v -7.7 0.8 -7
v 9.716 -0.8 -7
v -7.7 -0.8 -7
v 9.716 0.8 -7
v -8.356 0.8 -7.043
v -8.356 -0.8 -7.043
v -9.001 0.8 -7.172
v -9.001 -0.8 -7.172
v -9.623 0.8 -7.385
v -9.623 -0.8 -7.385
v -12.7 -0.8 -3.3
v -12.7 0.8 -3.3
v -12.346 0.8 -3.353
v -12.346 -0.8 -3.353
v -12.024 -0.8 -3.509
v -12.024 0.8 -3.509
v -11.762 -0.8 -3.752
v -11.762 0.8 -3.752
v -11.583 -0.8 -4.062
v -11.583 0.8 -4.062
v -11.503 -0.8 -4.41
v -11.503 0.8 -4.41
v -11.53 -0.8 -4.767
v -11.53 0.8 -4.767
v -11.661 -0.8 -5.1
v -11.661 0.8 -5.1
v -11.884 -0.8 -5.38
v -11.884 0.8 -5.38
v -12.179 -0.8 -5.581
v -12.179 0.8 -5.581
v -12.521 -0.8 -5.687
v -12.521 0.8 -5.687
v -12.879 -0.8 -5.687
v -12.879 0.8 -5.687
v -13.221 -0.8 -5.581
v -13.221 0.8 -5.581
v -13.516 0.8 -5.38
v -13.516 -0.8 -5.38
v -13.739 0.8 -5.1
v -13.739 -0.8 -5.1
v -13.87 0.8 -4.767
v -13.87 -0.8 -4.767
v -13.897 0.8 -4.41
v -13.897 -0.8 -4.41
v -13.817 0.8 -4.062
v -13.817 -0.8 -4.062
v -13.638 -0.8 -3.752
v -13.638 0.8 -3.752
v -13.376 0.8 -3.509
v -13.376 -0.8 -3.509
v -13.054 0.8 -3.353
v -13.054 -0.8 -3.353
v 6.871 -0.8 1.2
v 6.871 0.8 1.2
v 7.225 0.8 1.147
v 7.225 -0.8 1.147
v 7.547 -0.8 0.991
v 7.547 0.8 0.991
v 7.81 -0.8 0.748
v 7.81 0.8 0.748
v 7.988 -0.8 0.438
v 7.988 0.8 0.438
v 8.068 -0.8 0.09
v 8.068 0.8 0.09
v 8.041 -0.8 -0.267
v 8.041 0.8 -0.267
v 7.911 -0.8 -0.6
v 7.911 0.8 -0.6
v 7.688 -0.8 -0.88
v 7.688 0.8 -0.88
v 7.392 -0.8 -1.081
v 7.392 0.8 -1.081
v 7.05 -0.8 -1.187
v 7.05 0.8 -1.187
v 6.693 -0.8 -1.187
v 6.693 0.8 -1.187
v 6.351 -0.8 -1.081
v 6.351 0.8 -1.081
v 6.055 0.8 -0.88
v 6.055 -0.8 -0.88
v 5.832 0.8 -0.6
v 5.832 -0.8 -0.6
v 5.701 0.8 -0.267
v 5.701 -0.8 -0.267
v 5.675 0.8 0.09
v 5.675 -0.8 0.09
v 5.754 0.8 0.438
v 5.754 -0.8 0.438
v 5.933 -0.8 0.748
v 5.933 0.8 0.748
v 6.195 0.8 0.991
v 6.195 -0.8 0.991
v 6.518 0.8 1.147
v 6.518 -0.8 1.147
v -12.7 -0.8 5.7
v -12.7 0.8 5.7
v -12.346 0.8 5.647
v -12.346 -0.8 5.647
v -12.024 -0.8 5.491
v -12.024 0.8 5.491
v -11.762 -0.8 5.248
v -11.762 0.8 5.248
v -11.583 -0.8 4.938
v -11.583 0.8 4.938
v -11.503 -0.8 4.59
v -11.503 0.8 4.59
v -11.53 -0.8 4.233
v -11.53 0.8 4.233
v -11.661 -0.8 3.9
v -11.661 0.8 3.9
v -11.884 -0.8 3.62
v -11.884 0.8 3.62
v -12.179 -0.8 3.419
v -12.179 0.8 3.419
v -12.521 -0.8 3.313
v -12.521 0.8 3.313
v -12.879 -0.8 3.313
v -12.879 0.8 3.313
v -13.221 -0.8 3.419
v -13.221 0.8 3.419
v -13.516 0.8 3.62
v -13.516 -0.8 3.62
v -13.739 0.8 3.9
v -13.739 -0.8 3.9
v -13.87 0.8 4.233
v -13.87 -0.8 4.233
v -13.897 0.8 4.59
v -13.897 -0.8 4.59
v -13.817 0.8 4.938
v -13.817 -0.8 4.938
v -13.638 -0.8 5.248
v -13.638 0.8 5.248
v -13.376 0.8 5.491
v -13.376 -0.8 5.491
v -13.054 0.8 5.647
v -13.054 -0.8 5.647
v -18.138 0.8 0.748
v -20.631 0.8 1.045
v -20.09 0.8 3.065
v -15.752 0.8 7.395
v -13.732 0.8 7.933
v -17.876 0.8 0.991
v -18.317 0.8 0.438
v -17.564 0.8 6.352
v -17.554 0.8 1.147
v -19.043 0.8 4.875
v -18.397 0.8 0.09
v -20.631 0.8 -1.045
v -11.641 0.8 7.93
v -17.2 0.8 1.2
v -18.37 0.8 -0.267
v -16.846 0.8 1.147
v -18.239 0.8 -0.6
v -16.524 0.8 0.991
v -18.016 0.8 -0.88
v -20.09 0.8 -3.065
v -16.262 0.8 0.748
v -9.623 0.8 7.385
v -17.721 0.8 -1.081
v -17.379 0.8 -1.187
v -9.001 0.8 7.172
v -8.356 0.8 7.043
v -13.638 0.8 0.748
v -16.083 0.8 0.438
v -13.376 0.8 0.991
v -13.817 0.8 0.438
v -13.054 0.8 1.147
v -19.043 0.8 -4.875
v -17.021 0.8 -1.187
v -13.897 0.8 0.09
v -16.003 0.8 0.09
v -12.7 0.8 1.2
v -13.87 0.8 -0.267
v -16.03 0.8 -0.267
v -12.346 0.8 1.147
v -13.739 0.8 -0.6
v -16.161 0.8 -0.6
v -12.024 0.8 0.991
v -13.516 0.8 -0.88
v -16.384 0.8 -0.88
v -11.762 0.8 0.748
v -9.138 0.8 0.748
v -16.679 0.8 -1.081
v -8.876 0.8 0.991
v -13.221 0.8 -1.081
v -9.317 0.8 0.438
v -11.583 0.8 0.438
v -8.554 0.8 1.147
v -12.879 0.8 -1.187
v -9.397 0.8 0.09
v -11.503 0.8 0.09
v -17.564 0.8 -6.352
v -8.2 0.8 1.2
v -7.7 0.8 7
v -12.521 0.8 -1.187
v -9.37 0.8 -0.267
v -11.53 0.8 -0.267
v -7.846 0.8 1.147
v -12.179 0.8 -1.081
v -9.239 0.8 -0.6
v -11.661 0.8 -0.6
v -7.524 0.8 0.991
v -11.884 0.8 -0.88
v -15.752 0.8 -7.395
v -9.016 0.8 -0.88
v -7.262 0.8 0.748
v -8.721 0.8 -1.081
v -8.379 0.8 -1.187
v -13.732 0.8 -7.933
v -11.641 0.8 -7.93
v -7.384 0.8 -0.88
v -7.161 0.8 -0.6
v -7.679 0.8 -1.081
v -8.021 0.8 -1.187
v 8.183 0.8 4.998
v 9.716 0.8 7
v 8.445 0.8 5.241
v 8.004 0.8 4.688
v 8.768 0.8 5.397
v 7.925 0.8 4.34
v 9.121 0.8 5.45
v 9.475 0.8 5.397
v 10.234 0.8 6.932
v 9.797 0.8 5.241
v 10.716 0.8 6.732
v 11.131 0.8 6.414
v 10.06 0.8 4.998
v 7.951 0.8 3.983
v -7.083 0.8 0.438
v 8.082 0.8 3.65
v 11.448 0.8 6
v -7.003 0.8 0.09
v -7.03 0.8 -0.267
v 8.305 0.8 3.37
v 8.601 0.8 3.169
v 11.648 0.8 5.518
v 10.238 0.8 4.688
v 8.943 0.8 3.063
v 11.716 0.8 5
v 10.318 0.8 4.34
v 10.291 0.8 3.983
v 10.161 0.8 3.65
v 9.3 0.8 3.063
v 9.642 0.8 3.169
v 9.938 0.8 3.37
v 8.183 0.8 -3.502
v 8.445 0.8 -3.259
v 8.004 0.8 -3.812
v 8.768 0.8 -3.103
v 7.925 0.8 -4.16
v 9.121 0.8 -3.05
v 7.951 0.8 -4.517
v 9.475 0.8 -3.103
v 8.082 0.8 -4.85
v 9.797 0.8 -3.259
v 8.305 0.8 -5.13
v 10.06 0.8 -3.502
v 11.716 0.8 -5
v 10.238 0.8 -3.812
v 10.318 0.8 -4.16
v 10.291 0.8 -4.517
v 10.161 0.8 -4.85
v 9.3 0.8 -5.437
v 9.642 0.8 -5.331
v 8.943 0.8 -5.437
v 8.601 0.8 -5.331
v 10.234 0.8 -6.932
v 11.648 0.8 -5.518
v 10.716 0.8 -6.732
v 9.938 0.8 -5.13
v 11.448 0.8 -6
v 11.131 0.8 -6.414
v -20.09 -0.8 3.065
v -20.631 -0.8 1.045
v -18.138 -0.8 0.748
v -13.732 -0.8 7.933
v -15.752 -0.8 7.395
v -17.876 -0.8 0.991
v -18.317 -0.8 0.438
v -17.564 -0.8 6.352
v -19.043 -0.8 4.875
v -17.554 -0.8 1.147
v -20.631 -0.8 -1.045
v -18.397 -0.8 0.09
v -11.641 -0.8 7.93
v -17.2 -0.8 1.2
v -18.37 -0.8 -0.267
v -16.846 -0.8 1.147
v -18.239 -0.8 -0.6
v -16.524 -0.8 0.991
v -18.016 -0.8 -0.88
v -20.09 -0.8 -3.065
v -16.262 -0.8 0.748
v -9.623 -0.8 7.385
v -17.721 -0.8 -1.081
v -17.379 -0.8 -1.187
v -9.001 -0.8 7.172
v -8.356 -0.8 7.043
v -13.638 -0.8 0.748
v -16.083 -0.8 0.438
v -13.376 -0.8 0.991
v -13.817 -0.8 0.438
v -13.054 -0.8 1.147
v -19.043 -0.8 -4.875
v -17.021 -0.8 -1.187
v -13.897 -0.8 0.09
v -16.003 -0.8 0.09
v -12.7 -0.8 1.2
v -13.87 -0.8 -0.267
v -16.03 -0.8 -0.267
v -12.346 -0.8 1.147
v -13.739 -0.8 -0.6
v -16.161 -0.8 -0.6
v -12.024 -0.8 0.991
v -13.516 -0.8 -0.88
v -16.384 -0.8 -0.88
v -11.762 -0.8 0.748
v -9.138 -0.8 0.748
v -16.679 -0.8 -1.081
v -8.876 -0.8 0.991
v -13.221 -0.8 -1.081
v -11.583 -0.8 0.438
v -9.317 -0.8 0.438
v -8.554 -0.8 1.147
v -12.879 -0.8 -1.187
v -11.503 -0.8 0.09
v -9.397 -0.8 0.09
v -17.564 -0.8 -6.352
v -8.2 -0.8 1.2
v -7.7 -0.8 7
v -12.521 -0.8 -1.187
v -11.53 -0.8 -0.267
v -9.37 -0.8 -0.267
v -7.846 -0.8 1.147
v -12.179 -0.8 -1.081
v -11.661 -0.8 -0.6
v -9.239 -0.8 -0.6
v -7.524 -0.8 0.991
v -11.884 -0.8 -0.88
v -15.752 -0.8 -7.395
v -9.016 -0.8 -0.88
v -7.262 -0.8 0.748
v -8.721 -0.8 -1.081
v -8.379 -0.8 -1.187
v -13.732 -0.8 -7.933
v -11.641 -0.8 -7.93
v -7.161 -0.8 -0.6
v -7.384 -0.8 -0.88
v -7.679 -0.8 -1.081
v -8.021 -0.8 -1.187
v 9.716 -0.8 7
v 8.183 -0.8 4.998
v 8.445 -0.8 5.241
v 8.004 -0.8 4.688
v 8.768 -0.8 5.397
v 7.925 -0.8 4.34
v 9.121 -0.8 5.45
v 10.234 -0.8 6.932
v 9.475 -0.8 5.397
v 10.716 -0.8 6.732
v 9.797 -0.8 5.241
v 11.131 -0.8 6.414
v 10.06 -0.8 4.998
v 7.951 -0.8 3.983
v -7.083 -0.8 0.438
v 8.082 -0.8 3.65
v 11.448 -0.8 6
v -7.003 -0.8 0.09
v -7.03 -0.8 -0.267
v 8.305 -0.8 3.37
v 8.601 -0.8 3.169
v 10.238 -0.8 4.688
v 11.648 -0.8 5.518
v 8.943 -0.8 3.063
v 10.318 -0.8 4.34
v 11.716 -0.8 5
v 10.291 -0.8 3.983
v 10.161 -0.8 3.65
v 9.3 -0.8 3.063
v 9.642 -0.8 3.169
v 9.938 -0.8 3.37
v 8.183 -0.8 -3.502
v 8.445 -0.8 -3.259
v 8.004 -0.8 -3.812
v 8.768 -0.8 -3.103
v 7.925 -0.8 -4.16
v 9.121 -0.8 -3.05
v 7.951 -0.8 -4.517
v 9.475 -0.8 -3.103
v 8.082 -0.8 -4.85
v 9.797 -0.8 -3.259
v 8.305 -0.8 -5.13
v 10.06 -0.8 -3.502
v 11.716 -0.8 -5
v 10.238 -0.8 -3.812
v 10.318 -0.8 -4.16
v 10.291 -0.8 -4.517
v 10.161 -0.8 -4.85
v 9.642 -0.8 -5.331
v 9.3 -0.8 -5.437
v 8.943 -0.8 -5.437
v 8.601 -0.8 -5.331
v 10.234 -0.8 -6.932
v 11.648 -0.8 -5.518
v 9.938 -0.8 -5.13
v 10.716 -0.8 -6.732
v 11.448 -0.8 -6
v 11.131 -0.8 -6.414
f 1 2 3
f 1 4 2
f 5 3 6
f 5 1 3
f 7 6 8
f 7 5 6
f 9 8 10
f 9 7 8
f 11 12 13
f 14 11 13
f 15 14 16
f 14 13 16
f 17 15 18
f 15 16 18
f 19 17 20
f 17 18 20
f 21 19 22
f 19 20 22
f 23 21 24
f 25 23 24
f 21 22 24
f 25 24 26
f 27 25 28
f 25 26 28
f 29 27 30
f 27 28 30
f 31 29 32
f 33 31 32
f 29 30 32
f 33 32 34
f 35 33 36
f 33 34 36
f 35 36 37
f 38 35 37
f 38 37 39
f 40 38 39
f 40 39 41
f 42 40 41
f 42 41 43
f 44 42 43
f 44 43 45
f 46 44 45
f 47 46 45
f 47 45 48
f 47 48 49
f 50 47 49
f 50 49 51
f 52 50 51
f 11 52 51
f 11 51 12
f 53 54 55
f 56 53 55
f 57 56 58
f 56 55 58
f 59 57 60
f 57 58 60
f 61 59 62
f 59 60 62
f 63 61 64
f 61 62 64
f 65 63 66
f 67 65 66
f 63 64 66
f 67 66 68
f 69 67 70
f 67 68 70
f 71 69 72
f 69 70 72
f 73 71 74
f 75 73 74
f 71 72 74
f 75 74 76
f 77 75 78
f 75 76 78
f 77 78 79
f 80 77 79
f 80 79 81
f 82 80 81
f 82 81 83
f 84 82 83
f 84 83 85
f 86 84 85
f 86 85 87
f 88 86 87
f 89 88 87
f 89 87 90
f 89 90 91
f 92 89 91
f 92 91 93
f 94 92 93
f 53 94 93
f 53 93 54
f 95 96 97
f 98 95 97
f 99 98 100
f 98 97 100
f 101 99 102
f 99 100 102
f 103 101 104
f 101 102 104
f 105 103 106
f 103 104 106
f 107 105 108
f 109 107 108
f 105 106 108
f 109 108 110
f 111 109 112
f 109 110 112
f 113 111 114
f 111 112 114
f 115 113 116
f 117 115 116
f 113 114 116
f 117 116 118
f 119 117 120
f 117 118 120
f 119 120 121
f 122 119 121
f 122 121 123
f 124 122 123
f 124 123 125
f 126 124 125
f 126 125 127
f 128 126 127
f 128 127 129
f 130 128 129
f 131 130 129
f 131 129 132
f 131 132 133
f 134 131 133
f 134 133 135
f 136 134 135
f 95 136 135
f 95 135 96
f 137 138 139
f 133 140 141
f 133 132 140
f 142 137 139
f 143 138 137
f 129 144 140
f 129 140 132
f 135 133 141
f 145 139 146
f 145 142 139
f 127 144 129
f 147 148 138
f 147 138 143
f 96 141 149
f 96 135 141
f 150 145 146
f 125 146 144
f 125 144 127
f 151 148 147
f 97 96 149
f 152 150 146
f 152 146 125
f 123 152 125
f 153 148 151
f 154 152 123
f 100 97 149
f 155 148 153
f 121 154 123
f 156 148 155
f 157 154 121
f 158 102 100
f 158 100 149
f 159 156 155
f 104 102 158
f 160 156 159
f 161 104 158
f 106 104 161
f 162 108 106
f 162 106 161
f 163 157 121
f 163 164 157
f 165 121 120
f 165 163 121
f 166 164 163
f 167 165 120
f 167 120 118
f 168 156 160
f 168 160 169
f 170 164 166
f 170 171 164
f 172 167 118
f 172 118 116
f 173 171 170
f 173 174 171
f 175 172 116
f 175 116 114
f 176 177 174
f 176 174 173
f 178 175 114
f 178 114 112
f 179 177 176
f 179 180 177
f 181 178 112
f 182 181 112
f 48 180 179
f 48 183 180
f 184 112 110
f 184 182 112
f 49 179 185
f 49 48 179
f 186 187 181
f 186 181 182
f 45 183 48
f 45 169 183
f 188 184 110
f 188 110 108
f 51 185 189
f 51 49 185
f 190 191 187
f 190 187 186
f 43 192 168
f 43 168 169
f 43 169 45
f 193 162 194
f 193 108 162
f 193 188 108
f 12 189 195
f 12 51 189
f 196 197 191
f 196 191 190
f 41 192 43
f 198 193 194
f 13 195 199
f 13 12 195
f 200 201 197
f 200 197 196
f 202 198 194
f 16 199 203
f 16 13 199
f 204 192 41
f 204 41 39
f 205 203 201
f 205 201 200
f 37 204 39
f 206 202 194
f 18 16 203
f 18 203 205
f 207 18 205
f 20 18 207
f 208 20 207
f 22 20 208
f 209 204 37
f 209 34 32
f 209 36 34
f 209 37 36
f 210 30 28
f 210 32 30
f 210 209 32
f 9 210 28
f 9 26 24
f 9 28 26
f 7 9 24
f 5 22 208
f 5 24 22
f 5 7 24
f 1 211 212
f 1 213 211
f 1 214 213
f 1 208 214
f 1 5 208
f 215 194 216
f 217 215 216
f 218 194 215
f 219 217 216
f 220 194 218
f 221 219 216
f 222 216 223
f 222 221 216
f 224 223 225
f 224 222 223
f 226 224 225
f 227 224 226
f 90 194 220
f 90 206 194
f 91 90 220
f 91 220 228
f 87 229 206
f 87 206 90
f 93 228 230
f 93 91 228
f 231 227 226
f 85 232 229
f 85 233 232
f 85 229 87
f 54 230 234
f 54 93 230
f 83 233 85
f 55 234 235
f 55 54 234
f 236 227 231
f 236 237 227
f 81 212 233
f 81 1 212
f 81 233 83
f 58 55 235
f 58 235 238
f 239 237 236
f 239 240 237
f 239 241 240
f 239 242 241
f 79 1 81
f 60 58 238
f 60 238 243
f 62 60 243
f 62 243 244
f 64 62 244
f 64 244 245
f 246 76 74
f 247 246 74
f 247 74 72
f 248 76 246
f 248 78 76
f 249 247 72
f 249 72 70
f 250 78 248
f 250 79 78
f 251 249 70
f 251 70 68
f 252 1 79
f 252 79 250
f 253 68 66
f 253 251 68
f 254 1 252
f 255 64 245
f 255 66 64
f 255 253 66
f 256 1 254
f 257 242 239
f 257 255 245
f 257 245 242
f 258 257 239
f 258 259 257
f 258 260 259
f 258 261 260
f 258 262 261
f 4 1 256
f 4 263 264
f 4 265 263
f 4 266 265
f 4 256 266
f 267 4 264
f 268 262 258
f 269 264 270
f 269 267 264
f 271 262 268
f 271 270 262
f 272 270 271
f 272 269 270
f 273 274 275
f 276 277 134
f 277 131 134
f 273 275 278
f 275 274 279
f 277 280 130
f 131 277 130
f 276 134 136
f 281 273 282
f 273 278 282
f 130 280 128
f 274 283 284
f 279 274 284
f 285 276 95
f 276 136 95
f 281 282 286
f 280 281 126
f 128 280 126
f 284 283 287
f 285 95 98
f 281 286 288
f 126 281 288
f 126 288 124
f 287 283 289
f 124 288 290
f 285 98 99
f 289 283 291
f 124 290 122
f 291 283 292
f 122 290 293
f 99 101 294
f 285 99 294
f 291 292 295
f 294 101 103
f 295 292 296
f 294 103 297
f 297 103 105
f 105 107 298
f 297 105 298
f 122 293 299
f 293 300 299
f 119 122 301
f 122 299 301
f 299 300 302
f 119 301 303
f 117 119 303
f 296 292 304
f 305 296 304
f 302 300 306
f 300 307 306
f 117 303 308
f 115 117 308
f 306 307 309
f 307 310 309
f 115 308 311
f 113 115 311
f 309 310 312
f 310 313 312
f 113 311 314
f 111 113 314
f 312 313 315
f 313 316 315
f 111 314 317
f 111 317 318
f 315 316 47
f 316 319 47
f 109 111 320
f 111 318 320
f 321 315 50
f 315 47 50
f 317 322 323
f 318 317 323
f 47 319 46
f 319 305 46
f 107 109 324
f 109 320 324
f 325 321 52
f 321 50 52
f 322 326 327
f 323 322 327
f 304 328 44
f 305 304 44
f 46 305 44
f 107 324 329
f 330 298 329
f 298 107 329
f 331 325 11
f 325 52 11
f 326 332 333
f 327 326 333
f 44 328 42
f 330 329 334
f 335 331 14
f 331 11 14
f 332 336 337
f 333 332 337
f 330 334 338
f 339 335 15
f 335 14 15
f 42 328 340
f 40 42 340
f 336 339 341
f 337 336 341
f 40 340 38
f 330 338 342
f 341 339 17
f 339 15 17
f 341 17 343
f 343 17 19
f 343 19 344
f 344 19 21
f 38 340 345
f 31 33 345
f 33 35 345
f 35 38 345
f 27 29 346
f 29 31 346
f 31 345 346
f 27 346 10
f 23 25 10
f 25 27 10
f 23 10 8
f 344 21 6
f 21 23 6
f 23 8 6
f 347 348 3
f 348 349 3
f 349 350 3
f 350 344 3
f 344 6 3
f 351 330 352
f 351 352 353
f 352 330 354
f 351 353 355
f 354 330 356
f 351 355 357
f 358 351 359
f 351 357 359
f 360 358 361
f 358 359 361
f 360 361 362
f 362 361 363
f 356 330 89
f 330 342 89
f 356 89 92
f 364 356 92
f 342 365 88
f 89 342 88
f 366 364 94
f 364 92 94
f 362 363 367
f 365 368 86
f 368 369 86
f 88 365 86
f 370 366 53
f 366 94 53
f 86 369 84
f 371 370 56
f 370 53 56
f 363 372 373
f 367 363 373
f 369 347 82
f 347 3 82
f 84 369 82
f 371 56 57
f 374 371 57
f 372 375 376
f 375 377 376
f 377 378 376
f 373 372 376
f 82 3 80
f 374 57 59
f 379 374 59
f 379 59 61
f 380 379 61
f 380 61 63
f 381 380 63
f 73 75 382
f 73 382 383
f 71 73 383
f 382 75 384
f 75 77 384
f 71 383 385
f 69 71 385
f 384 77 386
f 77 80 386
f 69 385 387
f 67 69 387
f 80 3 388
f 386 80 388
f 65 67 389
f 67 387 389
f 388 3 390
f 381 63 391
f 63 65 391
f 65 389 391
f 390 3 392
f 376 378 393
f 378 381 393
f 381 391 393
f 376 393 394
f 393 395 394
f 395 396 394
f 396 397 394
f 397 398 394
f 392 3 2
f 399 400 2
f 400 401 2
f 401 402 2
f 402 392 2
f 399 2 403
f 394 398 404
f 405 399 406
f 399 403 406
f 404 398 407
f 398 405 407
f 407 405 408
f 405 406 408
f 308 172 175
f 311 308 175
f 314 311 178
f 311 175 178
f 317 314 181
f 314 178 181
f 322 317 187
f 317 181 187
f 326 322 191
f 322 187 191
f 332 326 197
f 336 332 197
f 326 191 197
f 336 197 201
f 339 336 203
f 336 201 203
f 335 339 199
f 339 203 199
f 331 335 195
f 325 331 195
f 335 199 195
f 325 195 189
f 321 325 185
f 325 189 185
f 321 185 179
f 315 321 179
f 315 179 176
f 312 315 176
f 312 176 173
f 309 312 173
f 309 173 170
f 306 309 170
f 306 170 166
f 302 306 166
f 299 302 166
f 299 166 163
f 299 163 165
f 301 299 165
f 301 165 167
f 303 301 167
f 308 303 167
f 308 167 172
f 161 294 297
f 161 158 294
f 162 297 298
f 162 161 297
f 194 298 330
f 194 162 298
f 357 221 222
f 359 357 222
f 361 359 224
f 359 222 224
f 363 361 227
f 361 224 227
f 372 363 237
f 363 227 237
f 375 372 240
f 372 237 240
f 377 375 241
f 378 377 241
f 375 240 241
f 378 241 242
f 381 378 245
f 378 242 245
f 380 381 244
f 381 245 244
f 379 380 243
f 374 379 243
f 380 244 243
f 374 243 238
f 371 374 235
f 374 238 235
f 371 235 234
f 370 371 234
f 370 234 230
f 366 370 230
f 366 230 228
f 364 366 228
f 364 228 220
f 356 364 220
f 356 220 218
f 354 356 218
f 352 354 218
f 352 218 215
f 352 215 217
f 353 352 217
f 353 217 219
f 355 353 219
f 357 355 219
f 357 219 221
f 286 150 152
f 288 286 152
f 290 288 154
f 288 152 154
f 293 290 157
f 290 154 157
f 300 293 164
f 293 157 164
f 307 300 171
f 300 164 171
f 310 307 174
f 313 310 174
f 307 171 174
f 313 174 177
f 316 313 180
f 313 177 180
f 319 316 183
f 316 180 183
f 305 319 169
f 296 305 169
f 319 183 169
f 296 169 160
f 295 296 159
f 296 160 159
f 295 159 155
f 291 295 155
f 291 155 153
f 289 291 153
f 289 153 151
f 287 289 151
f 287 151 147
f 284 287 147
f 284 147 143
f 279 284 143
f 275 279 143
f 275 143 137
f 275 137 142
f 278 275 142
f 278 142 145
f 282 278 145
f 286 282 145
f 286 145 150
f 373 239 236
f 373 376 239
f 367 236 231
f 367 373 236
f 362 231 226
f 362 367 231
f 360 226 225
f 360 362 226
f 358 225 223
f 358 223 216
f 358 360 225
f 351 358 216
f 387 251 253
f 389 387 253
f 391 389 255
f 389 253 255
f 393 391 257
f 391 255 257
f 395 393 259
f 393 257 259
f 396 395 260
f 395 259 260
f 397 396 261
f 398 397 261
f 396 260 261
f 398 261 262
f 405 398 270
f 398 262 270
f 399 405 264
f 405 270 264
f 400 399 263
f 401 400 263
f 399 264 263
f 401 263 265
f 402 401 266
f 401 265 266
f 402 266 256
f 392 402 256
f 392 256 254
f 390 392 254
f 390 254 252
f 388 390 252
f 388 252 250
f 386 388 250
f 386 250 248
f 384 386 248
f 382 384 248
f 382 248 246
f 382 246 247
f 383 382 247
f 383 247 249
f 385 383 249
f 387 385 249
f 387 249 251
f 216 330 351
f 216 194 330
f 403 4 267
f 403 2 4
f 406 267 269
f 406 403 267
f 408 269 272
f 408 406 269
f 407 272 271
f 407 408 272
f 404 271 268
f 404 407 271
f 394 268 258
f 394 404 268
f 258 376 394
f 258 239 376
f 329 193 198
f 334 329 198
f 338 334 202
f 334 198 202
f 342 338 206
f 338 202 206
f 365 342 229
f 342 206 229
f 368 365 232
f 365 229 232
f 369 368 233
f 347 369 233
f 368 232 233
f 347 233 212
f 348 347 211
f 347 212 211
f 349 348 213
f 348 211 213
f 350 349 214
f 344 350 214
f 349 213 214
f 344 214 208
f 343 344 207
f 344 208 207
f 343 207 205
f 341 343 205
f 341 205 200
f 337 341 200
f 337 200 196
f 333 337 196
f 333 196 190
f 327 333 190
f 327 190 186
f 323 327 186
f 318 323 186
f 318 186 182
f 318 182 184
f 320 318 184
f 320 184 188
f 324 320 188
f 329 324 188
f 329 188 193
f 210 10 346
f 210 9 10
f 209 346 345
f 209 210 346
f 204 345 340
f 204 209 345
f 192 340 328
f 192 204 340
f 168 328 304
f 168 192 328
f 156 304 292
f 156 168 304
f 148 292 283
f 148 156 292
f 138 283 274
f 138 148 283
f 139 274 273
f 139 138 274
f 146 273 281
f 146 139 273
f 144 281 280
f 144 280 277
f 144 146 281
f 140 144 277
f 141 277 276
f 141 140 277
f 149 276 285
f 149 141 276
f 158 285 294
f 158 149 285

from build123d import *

# Parameters (mm, degrees)
BOSS_EXTRUDE1_DEPTH = 0.8
FILLET1_R           = 2
FILLET2_R           = 5
SKETCH2_R           = 1.2
CUT_EXTRUDE1_DEPTH  = 23.249719099
SKETCH3_R           = 1.2
CUT_EXTRUDE2_DEPTH  = 23.249719099


with BuildPart() as part:
    # Sketch1 → Boss-Extrude1 (new, symmetric)
    with BuildSketch(Plane(origin=(0, 0, 0), x_dir=(1, 0, 0), z_dir=(0, 1, 0))):
        with BuildLine():
            Line((11.716387939, 7), (-8.827016654, 7))
            ThreePointArc((-8.827016654, 7), (-20.7, 0), (-8.827016654, -7))
            Line((-8.827016654, -7), (11.716387939, -7))
            Line((11.716387939, -7), (11.716387939, 7))
        make_face()
    extrude(amount=BOSS_EXTRUDE1_DEPTH, both=True)

    # Fillet1
    fillet1_edges = [part.edges().sort_by_distance(p)[0] for p in [
        (11.716387939, 0, 7),
        (11.716387939, 0, -7),
    ]]
    fillet(fillet1_edges, radius=FILLET1_R)

    # Fillet2
    fillet2_edges = [part.edges().sort_by_distance(p)[0] for p in [
        (-8.827016654, 0, 7),
        (-8.827016654, 0, -7),
    ]]
    fillet(fillet2_edges, radius=FILLET2_R)

    # Sketch2 → Cut-Extrude1 (cut, through all)
    with BuildSketch(Plane(origin=(0, 0.8, 0), x_dir=(1, 0, 0), z_dir=(0, 1, 0))):
        with Locations(Location((-8.2, 0, 0), (0, 0, 270))):
            Circle(SKETCH2_R)
        with Locations(Location((-12.7, 4.5, 0), (0, 0, 270))):
            Circle(SKETCH2_R)
        with Locations(Location((-17.2, 0, 0), (0, 0, 270))):
            Circle(SKETCH2_R)
        with Locations(Location((-12.7, -4.5, 0), (0, 0, 270))):
            Circle(SKETCH2_R)
        with Locations(Location((-12.7, 0, 0), (0, 0, 270))):
            Circle(SKETCH2_R)
    extrude(amount=-CUT_EXTRUDE1_DEPTH, mode=Mode.SUBTRACT)

    # Sketch3 → Cut-Extrude2 (cut, through all)
    with BuildSketch(Plane(origin=(0, 0.8, 0), x_dir=(1, 0, 0), z_dir=(0, 1, 0))):
        with Locations(Location((9.121387939, 4.25, 0), (0, 0, 270))):
            Circle(SKETCH3_R)
        with Locations(Location((9.121387939, -4.25, 0), (0, 0, 270))):
            Circle(SKETCH3_R)
        with Locations(Location((6.871387939, 0, 0), (0, 0, 270))):
            Circle(SKETCH3_R)
    extrude(amount=-CUT_EXTRUDE2_DEPTH, mode=Mode.SUBTRACT)


solid = part.part
